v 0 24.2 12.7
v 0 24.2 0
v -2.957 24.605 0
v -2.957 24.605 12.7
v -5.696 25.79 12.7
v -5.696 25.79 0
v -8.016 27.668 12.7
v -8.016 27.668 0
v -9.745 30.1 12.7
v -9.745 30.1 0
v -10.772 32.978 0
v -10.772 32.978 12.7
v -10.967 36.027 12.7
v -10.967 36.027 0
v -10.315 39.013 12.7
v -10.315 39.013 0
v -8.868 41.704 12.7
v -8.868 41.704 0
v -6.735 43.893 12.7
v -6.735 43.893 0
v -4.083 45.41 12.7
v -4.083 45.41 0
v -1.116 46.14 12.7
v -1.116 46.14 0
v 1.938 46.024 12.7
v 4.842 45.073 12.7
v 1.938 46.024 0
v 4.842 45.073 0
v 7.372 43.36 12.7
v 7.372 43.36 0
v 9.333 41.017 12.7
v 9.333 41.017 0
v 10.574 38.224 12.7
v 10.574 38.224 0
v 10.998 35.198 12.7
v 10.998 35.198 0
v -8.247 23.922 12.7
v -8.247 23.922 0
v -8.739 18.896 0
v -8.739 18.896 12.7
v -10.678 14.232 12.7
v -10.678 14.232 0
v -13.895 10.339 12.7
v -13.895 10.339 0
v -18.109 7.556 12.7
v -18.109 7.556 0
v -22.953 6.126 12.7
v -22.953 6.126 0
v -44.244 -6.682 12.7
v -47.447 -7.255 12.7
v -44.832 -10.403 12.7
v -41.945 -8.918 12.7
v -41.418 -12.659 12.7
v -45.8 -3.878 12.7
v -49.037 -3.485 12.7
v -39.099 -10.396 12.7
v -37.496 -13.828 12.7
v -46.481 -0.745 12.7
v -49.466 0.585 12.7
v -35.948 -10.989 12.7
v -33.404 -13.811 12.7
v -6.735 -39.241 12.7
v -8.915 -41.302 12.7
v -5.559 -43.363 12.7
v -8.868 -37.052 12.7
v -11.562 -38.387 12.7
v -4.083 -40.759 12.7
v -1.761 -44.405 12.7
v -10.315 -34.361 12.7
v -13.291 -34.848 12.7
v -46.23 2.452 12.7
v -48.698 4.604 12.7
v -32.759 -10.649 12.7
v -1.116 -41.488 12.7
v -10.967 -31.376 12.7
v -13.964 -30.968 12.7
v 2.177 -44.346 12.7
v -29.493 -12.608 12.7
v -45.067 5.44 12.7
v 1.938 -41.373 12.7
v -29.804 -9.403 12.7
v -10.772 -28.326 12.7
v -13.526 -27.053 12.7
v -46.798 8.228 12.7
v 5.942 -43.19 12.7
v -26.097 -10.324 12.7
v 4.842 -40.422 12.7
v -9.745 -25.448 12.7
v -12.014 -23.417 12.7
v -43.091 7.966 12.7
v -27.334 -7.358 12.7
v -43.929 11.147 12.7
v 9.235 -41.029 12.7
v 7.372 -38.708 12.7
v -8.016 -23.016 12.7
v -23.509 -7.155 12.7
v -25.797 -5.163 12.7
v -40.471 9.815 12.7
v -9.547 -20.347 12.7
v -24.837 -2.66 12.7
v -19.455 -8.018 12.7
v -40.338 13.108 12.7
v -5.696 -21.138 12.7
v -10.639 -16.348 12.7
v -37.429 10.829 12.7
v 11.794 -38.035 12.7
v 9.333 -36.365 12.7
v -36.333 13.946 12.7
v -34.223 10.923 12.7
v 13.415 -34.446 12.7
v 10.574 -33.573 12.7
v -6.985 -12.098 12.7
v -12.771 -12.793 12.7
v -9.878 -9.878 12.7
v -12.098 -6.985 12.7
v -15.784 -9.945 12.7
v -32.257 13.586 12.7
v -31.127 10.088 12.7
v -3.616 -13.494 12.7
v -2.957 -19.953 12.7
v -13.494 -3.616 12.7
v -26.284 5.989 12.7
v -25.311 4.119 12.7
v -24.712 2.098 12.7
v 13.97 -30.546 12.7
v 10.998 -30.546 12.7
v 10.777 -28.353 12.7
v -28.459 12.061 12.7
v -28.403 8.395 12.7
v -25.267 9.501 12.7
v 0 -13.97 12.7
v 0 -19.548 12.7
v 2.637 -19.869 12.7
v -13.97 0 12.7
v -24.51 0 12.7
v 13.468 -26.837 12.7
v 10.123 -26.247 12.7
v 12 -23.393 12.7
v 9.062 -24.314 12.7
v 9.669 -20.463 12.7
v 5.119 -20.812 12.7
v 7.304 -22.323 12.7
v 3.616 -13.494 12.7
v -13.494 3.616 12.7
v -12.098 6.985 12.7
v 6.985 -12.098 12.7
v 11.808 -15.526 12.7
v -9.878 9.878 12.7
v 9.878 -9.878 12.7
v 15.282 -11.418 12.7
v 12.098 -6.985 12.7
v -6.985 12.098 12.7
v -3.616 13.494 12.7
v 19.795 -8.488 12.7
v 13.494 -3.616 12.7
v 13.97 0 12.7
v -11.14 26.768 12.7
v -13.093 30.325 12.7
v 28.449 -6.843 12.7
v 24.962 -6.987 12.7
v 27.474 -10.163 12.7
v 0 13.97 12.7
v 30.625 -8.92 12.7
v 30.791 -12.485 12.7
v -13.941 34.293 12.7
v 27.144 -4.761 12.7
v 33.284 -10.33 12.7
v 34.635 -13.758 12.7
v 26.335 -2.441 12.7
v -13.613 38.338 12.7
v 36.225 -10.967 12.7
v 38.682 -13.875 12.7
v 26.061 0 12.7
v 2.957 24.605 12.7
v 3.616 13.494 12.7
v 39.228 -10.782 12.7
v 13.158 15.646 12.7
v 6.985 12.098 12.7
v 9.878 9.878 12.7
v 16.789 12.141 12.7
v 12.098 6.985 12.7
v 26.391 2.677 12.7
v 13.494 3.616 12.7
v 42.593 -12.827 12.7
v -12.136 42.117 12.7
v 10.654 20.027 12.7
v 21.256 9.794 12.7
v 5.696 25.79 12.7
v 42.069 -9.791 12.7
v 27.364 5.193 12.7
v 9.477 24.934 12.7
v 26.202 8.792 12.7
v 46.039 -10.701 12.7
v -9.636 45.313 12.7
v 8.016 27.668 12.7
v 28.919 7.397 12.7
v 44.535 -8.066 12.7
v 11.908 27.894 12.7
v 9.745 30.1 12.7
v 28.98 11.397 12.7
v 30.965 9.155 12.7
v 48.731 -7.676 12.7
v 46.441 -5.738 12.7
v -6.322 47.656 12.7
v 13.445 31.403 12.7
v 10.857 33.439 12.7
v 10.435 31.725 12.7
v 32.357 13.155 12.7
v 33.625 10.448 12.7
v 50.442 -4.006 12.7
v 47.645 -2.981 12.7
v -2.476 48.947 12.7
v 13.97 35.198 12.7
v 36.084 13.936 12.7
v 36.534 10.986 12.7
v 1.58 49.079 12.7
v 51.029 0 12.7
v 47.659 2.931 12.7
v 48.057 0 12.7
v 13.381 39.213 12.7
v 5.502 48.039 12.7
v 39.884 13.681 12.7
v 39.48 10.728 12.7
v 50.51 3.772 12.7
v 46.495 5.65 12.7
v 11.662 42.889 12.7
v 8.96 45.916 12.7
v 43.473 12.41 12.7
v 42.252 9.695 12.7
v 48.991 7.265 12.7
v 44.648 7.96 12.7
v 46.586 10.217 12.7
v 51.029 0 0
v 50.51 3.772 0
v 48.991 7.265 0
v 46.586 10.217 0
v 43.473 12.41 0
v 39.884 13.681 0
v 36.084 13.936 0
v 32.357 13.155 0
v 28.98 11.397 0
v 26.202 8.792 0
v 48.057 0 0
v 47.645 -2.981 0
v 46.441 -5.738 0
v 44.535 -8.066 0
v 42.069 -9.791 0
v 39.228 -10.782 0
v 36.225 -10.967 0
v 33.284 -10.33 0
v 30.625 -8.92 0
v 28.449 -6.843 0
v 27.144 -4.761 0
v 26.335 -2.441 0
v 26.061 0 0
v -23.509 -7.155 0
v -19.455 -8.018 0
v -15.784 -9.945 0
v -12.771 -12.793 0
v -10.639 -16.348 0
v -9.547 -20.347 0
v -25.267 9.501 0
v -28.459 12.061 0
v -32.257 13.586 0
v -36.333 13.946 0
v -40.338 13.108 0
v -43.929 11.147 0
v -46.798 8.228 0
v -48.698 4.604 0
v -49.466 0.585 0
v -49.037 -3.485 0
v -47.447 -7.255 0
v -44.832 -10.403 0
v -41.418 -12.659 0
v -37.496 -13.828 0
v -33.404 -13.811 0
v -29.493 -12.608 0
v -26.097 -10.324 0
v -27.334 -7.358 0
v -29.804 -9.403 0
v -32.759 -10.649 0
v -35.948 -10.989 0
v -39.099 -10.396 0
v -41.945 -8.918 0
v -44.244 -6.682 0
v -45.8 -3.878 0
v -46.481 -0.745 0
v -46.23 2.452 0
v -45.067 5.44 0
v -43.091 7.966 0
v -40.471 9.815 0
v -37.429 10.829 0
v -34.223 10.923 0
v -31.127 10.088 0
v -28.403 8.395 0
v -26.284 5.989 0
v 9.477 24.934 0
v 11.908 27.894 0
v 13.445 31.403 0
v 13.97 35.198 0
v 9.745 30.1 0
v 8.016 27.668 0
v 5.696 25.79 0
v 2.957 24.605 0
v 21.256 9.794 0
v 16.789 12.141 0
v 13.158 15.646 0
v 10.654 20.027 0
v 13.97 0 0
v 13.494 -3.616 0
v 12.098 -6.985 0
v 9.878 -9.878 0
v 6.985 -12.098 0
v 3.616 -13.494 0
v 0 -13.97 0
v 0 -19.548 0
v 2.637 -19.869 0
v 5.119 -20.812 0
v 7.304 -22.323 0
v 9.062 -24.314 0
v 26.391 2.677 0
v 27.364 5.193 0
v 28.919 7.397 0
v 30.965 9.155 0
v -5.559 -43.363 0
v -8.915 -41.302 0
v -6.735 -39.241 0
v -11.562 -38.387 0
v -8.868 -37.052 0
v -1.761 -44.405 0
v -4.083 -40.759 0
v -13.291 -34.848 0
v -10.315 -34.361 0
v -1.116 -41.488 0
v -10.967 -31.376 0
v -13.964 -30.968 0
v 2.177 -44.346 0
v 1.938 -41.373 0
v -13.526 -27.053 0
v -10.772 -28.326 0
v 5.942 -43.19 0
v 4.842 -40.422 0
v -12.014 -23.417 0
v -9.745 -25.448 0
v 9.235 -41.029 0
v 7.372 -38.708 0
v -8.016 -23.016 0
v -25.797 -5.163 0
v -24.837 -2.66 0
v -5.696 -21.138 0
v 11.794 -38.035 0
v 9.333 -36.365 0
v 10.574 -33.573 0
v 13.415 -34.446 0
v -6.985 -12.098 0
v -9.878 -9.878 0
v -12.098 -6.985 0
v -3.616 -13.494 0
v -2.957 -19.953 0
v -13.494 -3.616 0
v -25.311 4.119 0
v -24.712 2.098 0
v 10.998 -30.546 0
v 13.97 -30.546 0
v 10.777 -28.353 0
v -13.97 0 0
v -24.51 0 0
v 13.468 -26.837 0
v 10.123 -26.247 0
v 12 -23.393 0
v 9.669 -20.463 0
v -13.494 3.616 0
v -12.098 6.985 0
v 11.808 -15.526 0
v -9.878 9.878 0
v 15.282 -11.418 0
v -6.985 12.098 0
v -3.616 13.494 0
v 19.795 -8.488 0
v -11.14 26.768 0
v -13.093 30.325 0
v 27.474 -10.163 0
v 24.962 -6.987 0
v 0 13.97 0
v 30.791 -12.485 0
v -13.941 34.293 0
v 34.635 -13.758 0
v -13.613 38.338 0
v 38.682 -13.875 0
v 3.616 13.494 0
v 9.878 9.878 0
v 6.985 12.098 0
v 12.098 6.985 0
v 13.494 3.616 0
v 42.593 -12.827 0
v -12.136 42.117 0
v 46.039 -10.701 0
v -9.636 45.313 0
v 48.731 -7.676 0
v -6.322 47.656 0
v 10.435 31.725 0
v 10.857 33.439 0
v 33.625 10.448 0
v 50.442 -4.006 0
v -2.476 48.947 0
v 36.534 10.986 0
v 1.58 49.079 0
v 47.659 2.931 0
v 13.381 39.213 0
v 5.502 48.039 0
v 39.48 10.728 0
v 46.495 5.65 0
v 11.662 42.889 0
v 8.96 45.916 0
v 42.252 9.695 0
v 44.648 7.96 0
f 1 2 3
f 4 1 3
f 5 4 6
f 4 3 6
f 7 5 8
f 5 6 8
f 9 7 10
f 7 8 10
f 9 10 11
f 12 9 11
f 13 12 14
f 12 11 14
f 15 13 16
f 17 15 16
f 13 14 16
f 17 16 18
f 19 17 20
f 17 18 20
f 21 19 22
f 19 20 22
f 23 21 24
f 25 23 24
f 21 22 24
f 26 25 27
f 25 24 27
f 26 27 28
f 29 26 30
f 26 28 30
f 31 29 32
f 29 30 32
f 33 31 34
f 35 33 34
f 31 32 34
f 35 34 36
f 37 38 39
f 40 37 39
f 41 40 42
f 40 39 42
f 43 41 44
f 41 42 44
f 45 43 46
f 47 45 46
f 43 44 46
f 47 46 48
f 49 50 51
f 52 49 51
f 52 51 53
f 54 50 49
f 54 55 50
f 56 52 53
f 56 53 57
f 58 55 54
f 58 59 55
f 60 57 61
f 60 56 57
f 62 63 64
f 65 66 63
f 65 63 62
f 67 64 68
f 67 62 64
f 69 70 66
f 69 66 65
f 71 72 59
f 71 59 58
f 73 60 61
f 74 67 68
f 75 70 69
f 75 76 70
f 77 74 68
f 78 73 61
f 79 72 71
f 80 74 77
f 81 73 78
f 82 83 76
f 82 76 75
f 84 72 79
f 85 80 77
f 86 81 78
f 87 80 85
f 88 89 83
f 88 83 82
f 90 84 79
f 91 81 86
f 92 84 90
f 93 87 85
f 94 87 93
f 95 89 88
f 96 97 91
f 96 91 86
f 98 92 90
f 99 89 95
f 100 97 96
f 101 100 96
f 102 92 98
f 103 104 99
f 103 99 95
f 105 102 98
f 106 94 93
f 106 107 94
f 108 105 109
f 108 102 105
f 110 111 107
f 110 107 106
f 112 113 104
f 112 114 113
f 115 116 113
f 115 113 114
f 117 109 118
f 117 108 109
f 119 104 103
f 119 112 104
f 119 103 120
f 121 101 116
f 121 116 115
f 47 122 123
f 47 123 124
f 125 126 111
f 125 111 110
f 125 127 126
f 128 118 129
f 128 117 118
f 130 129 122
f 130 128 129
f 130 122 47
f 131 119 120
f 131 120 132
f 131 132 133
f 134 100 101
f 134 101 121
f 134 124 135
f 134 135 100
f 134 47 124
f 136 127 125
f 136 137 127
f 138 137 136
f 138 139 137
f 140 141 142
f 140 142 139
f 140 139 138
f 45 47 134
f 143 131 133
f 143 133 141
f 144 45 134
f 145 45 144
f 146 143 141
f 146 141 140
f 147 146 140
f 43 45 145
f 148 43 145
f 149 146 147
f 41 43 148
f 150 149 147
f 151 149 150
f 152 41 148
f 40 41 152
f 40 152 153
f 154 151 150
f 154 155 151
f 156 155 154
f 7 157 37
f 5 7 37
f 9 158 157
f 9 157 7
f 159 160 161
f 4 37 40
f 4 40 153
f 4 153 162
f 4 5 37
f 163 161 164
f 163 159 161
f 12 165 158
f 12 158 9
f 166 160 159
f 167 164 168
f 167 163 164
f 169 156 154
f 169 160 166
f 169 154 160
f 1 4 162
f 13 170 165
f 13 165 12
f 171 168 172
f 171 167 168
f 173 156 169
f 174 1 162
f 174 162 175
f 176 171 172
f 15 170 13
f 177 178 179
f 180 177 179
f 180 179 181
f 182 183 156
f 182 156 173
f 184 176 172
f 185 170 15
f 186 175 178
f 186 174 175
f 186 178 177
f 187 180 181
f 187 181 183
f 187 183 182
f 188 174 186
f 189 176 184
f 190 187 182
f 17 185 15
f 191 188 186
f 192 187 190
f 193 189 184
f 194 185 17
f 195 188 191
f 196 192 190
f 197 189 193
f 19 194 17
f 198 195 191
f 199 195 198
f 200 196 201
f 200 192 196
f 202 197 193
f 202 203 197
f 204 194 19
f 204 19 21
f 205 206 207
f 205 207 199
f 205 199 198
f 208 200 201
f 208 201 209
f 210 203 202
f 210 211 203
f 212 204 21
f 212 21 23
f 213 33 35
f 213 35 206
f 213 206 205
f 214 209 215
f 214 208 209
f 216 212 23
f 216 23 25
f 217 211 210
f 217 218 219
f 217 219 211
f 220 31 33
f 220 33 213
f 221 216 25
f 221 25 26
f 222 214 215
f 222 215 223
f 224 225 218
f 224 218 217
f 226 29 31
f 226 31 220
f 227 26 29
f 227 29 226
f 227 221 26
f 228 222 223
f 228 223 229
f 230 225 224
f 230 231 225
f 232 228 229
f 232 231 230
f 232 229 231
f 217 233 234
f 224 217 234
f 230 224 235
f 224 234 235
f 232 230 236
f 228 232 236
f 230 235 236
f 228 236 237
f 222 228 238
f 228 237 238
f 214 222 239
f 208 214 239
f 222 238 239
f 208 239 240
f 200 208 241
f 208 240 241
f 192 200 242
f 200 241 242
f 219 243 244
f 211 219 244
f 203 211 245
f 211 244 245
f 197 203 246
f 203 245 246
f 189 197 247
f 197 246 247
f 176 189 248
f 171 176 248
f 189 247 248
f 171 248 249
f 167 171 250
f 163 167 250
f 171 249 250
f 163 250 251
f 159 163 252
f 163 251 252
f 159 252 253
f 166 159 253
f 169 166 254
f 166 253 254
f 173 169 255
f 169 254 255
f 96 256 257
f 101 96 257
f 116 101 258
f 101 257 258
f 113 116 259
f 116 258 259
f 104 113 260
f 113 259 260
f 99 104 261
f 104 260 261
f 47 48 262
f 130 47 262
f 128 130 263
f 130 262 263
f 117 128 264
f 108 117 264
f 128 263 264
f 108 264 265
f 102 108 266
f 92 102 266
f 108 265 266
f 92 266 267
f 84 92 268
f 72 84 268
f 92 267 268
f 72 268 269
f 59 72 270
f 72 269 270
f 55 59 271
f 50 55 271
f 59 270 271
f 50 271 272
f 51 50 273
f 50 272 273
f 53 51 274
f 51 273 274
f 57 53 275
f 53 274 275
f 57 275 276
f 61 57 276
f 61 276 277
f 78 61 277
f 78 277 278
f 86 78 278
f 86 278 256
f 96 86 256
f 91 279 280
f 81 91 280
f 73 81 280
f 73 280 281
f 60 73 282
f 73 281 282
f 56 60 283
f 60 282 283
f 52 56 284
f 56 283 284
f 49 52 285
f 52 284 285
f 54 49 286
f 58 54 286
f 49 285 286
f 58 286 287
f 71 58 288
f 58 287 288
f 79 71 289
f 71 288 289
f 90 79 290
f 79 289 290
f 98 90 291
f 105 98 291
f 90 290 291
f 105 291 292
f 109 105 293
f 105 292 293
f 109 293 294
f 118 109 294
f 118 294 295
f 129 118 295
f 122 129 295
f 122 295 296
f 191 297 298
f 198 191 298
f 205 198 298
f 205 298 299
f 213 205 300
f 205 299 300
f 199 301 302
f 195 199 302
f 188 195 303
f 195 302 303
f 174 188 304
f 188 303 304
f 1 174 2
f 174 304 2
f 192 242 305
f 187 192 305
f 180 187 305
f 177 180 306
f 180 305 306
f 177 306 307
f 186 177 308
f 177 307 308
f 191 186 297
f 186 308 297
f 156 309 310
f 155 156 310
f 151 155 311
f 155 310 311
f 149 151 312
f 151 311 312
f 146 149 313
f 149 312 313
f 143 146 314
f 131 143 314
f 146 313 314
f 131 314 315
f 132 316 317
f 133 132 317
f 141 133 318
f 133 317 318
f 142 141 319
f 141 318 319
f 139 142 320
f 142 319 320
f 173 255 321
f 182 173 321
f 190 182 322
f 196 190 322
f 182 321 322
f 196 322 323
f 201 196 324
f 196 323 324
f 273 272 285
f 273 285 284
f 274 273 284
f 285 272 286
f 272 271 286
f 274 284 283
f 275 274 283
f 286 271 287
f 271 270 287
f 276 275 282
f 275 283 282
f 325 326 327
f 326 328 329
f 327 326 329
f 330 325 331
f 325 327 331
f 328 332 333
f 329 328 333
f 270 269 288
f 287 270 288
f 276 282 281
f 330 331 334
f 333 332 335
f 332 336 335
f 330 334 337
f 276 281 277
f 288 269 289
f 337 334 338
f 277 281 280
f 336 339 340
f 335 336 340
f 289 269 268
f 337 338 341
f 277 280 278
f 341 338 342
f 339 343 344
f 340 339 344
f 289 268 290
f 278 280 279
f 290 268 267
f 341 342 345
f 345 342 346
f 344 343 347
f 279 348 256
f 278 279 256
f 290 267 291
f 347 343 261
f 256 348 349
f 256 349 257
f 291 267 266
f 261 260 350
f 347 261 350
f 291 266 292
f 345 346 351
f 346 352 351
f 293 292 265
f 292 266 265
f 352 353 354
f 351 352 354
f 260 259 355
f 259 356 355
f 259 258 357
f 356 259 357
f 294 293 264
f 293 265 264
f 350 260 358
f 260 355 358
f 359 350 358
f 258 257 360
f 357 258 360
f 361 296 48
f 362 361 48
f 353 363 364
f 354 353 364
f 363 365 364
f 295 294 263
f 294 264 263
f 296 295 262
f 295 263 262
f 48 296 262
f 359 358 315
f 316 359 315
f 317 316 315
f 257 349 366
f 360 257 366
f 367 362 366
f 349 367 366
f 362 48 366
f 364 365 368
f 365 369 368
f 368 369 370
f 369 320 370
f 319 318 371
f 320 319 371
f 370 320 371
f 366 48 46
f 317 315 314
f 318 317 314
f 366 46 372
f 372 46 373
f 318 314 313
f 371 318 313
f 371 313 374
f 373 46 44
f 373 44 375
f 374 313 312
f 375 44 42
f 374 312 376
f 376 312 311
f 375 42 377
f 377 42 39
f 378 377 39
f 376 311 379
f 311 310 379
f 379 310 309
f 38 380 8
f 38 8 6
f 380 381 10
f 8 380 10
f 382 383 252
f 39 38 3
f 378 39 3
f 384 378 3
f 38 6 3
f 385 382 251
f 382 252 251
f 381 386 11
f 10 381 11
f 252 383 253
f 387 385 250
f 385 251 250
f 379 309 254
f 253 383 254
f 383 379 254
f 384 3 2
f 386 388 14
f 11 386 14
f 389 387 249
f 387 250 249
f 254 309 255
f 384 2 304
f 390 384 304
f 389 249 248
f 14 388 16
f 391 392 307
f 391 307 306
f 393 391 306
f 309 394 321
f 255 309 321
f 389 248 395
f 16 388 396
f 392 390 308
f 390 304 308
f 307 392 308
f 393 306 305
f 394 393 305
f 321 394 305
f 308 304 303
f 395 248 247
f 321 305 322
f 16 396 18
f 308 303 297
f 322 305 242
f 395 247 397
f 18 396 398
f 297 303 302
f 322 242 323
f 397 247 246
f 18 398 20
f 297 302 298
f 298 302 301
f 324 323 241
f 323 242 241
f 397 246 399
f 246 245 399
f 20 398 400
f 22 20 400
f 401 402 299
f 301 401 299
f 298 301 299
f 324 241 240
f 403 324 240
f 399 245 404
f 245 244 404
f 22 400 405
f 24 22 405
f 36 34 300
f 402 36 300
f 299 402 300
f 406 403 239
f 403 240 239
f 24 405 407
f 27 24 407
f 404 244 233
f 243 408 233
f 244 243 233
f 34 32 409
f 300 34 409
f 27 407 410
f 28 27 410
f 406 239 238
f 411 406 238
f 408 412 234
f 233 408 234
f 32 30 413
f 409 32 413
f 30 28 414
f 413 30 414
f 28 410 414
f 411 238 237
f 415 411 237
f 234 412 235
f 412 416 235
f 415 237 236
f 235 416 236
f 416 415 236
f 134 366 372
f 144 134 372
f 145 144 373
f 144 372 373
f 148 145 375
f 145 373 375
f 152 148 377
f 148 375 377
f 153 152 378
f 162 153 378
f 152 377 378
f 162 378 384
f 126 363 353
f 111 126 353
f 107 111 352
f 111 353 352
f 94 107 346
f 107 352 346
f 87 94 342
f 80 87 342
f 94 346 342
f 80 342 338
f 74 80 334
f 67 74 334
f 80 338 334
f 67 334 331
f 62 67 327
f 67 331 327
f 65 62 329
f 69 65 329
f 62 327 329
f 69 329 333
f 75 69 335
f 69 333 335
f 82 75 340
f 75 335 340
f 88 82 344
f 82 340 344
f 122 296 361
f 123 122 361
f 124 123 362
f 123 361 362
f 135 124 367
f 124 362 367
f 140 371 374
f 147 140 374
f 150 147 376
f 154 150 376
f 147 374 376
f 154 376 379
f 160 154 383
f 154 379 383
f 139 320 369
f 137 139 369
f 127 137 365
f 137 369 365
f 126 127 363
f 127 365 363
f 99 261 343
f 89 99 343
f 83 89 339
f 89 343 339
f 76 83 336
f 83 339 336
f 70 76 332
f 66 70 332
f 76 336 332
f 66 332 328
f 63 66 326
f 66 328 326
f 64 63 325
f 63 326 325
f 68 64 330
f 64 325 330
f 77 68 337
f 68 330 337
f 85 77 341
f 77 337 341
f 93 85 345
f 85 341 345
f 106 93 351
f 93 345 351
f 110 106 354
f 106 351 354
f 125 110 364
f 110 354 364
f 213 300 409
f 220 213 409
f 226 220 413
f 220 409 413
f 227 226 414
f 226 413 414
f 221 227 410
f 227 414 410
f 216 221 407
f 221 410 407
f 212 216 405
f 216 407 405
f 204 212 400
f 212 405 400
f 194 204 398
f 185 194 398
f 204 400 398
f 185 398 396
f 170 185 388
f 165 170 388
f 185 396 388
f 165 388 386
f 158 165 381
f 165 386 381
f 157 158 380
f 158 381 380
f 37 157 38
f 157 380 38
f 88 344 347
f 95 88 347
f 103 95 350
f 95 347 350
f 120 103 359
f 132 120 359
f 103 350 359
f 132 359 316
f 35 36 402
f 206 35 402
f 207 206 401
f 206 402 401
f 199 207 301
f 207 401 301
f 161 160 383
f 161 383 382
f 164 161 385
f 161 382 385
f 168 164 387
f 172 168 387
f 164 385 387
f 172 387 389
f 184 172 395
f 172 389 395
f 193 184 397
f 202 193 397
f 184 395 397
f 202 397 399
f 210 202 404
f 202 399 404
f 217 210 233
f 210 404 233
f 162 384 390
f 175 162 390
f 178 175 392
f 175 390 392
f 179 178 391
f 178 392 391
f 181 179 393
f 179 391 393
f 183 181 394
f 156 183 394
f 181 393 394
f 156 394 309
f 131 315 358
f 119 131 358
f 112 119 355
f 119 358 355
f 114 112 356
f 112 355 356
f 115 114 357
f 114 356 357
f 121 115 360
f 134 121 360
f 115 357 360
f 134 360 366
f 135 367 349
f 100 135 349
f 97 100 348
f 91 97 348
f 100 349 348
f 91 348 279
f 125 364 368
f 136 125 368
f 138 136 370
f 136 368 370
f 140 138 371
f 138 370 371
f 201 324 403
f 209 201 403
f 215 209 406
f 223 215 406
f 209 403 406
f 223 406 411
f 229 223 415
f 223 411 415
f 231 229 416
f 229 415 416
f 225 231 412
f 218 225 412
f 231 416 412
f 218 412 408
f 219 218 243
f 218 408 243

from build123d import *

# Parameters (mm, degrees)
F1_DEPTH = 12.7


with BuildPart() as f1:
    # F0 (on Top) → F1 (new body)
    with BuildSketch(Plane.XY):
        with BuildLine():
            ThreePointArc((-26.2838029012, 5.9890534429), (-24.6151248103, 5.9761621536), (-22.9531423273, 6.1260520558))
            ThreePointArc((-22.9531423273, 6.1260520558), (-49.4660776258, 0.5846286719), (-23.509406267, -7.1545136085))
            ThreePointArc((-23.509406267, -7.1545136085), (-25.4282077221, -7.135411063), (-27.3341276607, -7.3581959791))
            ThreePointArc((-27.3341276607, -7.3581959791), (-46.4726203609, 0.8628055089), (-26.2838029012, 5.9890534429))
        make_face()
        with BuildLine():
            Line((-24.5101160102, 0), (-21.5383160102, 0))
            ThreePointArc((-21.5383160102, 0), (-21.8966174323, 3.1436542152), (-22.9531423273, 6.1260520558))
            ThreePointArc((-22.9531423273, 6.1260520558), (-24.6151248103, 5.9761621536), (-26.2838029012, 5.9890534429))
            ThreePointArc((-26.2838029012, 5.9890534429), (-24.9628562451, 3.1230884685), (-24.5101160102, 0))
        make_face()
        with BuildLine():
            ThreePointArc((-23.509406267, -7.1545136085), (-22.0401002948, -3.7105343879), (-21.5383160102, 0))
            Line((-21.5383160102, 0), (-24.5101160102, 0))
            ThreePointArc((-24.5101160102, 0), (-25.2403619408, -3.9407515105), (-27.3341276607, -7.3581959791))
            ThreePointArc((-27.3341276607, -7.3581959791), (-25.4282077221, -7.135411063), (-23.509406267, -7.1545136085))
        make_face()
        with BuildLine():
            ThreePointArc((-13.97, 0), (-9.8782817332, 9.8782817332), (0, 13.97))
            Line((0, 13.97), (0, 21.2281967688))
            ThreePointArc((0, 21.2281967688), (-4.3381640986, 21.9188431605), (-8.2473894167, 23.922494227))
            ThreePointArc((-8.2473894167, 23.922494227), (-12.1416726615, 12.1663301502), (-22.9531423273, 6.1260520558))
            ThreePointArc((-22.9531423273, 6.1260520558), (-21.8966174323, 3.1436542152), (-21.5383160102, 0))
            Line((-21.5383160102, 0), (-13.97, 0))
        make_face()
        with BuildLine():
            Line((0, -16.5764547127), (0, -13.97))
            ThreePointArc((0, -13.97), (-9.8782817332, -9.8782817332), (-13.97, 0))
            Line((-13.97, 0), (-21.5383160102, 0))
            ThreePointArc((-21.5383160102, 0), (-22.0401002948, -3.7105343879), (-23.509406267, -7.1545136085))
            ThreePointArc((-23.509406267, -7.1545136085), (-14.1800112892, -11.2658599468), (-9.5466303459, -20.3473003831))
            ThreePointArc((-9.5466303459, -20.3473003831), (-5.1321883254, -17.5533202567), (0, -16.5764547127))
        make_face()
        with BuildLine():
            ThreePointArc((13.97, -30.5464547127), (12.8498346481, -25.0653371701), (9.6689764472, -20.4632114615))
            ThreePointArc((9.6689764472, -20.4632114615), (9.263305422, -22.3725482488), (9.0618977051, -24.3140865254))
            ThreePointArc((9.0618977051, -24.3140865254), (10.5029749733, -27.2833396443), (10.9982, -30.5464547127))
            ThreePointArc((10.9982, -30.5464547127), (-2.625018329, -41.2267956255), (-9.7451365483, -25.4481494163))
            ThreePointArc((-9.7451365483, -25.4481494163), (-9.4302368554, -22.9061170685), (-9.5466303459, -20.3473003831))
            ThreePointArc((-9.5466303459, -20.3473003831), (-5.5585283155, -43.3629933627), (13.97, -30.5464547127))
        make_face()
        with BuildLine():
            ThreePointArc((9.6689764472, -20.4632114615), (5.2104698339, -17.5845141131), (0, -16.5764547127))
            Line((0, -16.5764547127), (0, -19.5482547127))
            ThreePointArc((0, -19.5482547127), (5.1193540335, -20.8123590938), (9.0618977051, -24.3140865254))
            ThreePointArc((9.0618977051, -24.3140865254), (9.263305422, -22.3725482488), (9.6689764472, -20.4632114615))
        make_face()
        with BuildLine():
            Line((0, -19.5482547127), (0, -16.5764547127))
            ThreePointArc((0, -16.5764547127), (-5.1321883254, -17.5533202567), (-9.5466303459, -20.3473003831))
            ThreePointArc((-9.5466303459, -20.3473003831), (-9.4302368554, -22.9061170685), (-9.7451365483, -25.4481494163))
            ThreePointArc((-9.7451365483, -25.4481494163), (-5.6959732236, -21.1381449668), (0, -19.5482547127))
        make_face()
        with BuildLine():
            Line((23.0888973165, 0), (13.97, 0))
            ThreePointArc((13.97, 0), (9.8782817332, -9.8782817332), (0, -13.97))
            Line((0, -13.97), (0, -16.5764547127))
            ThreePointArc((0, -16.5764547127), (5.2104698339, -17.5845141131), (9.6689764472, -20.4632114615))
            ThreePointArc((9.6689764472, -20.4632114615), (15.2821696202, -11.4178910111), (24.9617009206, -6.9870408157))
            ThreePointArc((24.9617009206, -6.9870408157), (23.5652185436, -3.6168402197), (23.0888973165, 0))
        make_face()
        with BuildLine():
            ThreePointArc((51.0288973165, 0), (41.7222021913, 13.1686934676), (26.2021990138, 8.7916438716))
            ThreePointArc((26.2021990138, 8.7916438716), (28.5955998519, 8.8133611699), (30.9645498306, 9.1552898349))
            ThreePointArc((30.9645498306, 9.1552898349), (42.2518517126, 9.6950310922), (48.0570973165, 0))
            ThreePointArc((48.0570973165, 0), (40.6825557587, -10.3840985518), (28.4485245075, -6.8426517763))
            ThreePointArc((28.4485245075, -6.8426517763), (26.701686584, -6.8321093301), (24.9617009206, -6.9870408157))
            ThreePointArc((24.9617009206, -6.9870408157), (40.6757375362, -13.4936787729), (51.0288973165, 0))
        make_face()
        with BuildLine():
            ThreePointArc((26.2021990138, 8.7916438716), (23.8902038488, 4.6633048748), (23.0888973165, 0))
            Line((23.0888973165, 0), (26.0606973165, 0))
            ThreePointArc((26.0606973165, 0), (27.3638662242, 5.1929543961), (30.9645498306, 9.1552898349))
            ThreePointArc((30.9645498306, 9.1552898349), (28.5955998519, 8.8133611699), (26.2021990138, 8.7916438716))
        make_face()
        with BuildLine():
            Line((26.0606973165, 0), (23.0888973165, 0))
            ThreePointArc((23.0888973165, 0), (23.5652185436, -3.6168402197), (24.9617009206, -6.9870408157))
            ThreePointArc((24.9617009206, -6.9870408157), (26.701686584, -6.8321093301), (28.4485245075, -6.8426517763))
            ThreePointArc((28.4485245075, -6.8426517763), (26.6747987646, -3.6236584423), (26.0606973165, 0))
        make_face()
        with BuildLine():
            ThreePointArc((0, 13.97), (9.8782817332, 9.8782817332), (13.97, 0))
            Line((13.97, 0), (23.0888973165, 0))
            ThreePointArc((23.0888973165, 0), (23.8902038488, 4.6633048748), (26.2021990138, 8.7916438716))
            ThreePointArc((26.2021990138, 8.7916438716), (14.8492633775, 13.7645914435), (9.476547394, 24.9338921412))
            ThreePointArc((9.476547394, 24.9338921412), (5.0876597937, 22.1875619716), (0, 21.2281967688))
            Line((0, 21.2281967688), (0, 13.97))
        make_face()
        with BuildLine():
            ThreePointArc((13.97, 35.1981967688), (-6.3223757342, 47.655663007), (-8.2473894167, 23.922494227))
            ThreePointArc((-8.2473894167, 23.922494227), (-8.7065761615, 27.0814291625), (-9.7451365483, 30.0998914723))
            ThreePointArc((-9.7451365483, 30.0998914723), (-2.625018329, 45.8785376815), (10.9982, 35.1981967688))
            ThreePointArc((10.9982, 35.1981967688), (10.6803409127, 32.5731784398), (9.7451365483, 30.0998914723))
            ThreePointArc((9.7451365483, 30.0998914723), (9.4225906062, 27.5266793177), (9.476547394, 24.9338921412))
            ThreePointArc((9.476547394, 24.9338921412), (12.7974268331, 29.5958074167), (13.97, 35.1981967688))
        make_face()
        with BuildLine():
            Line((0, 24.1999967688), (0, 21.2281967688))
            ThreePointArc((0, 21.2281967688), (5.0876597937, 22.1875619716), (9.476547394, 24.9338921412))
            ThreePointArc((9.476547394, 24.9338921412), (9.4225906062, 27.5266793177), (9.7451365483, 30.0998914723))
            ThreePointArc((9.7451365483, 30.0998914723), (5.6959732236, 25.7898870228), (0, 24.1999967688))
        make_face()
        with BuildLine():
            ThreePointArc((-8.2473894167, 23.922494227), (-4.3381640986, 21.9188431605), (0, 21.2281967688))
            Line((0, 21.2281967688), (0, 24.1999967688))
            ThreePointArc((0, 24.1999967688), (-5.6959732236, 25.7898870228), (-9.7451365483, 30.0998914723))
            ThreePointArc((-9.7451365483, 30.0998914723), (-8.7065761615, 27.0814291625), (-8.2473894167, 23.922494227))
        make_face()
    extrude(amount=F1_DEPTH)


solid = f1.part
